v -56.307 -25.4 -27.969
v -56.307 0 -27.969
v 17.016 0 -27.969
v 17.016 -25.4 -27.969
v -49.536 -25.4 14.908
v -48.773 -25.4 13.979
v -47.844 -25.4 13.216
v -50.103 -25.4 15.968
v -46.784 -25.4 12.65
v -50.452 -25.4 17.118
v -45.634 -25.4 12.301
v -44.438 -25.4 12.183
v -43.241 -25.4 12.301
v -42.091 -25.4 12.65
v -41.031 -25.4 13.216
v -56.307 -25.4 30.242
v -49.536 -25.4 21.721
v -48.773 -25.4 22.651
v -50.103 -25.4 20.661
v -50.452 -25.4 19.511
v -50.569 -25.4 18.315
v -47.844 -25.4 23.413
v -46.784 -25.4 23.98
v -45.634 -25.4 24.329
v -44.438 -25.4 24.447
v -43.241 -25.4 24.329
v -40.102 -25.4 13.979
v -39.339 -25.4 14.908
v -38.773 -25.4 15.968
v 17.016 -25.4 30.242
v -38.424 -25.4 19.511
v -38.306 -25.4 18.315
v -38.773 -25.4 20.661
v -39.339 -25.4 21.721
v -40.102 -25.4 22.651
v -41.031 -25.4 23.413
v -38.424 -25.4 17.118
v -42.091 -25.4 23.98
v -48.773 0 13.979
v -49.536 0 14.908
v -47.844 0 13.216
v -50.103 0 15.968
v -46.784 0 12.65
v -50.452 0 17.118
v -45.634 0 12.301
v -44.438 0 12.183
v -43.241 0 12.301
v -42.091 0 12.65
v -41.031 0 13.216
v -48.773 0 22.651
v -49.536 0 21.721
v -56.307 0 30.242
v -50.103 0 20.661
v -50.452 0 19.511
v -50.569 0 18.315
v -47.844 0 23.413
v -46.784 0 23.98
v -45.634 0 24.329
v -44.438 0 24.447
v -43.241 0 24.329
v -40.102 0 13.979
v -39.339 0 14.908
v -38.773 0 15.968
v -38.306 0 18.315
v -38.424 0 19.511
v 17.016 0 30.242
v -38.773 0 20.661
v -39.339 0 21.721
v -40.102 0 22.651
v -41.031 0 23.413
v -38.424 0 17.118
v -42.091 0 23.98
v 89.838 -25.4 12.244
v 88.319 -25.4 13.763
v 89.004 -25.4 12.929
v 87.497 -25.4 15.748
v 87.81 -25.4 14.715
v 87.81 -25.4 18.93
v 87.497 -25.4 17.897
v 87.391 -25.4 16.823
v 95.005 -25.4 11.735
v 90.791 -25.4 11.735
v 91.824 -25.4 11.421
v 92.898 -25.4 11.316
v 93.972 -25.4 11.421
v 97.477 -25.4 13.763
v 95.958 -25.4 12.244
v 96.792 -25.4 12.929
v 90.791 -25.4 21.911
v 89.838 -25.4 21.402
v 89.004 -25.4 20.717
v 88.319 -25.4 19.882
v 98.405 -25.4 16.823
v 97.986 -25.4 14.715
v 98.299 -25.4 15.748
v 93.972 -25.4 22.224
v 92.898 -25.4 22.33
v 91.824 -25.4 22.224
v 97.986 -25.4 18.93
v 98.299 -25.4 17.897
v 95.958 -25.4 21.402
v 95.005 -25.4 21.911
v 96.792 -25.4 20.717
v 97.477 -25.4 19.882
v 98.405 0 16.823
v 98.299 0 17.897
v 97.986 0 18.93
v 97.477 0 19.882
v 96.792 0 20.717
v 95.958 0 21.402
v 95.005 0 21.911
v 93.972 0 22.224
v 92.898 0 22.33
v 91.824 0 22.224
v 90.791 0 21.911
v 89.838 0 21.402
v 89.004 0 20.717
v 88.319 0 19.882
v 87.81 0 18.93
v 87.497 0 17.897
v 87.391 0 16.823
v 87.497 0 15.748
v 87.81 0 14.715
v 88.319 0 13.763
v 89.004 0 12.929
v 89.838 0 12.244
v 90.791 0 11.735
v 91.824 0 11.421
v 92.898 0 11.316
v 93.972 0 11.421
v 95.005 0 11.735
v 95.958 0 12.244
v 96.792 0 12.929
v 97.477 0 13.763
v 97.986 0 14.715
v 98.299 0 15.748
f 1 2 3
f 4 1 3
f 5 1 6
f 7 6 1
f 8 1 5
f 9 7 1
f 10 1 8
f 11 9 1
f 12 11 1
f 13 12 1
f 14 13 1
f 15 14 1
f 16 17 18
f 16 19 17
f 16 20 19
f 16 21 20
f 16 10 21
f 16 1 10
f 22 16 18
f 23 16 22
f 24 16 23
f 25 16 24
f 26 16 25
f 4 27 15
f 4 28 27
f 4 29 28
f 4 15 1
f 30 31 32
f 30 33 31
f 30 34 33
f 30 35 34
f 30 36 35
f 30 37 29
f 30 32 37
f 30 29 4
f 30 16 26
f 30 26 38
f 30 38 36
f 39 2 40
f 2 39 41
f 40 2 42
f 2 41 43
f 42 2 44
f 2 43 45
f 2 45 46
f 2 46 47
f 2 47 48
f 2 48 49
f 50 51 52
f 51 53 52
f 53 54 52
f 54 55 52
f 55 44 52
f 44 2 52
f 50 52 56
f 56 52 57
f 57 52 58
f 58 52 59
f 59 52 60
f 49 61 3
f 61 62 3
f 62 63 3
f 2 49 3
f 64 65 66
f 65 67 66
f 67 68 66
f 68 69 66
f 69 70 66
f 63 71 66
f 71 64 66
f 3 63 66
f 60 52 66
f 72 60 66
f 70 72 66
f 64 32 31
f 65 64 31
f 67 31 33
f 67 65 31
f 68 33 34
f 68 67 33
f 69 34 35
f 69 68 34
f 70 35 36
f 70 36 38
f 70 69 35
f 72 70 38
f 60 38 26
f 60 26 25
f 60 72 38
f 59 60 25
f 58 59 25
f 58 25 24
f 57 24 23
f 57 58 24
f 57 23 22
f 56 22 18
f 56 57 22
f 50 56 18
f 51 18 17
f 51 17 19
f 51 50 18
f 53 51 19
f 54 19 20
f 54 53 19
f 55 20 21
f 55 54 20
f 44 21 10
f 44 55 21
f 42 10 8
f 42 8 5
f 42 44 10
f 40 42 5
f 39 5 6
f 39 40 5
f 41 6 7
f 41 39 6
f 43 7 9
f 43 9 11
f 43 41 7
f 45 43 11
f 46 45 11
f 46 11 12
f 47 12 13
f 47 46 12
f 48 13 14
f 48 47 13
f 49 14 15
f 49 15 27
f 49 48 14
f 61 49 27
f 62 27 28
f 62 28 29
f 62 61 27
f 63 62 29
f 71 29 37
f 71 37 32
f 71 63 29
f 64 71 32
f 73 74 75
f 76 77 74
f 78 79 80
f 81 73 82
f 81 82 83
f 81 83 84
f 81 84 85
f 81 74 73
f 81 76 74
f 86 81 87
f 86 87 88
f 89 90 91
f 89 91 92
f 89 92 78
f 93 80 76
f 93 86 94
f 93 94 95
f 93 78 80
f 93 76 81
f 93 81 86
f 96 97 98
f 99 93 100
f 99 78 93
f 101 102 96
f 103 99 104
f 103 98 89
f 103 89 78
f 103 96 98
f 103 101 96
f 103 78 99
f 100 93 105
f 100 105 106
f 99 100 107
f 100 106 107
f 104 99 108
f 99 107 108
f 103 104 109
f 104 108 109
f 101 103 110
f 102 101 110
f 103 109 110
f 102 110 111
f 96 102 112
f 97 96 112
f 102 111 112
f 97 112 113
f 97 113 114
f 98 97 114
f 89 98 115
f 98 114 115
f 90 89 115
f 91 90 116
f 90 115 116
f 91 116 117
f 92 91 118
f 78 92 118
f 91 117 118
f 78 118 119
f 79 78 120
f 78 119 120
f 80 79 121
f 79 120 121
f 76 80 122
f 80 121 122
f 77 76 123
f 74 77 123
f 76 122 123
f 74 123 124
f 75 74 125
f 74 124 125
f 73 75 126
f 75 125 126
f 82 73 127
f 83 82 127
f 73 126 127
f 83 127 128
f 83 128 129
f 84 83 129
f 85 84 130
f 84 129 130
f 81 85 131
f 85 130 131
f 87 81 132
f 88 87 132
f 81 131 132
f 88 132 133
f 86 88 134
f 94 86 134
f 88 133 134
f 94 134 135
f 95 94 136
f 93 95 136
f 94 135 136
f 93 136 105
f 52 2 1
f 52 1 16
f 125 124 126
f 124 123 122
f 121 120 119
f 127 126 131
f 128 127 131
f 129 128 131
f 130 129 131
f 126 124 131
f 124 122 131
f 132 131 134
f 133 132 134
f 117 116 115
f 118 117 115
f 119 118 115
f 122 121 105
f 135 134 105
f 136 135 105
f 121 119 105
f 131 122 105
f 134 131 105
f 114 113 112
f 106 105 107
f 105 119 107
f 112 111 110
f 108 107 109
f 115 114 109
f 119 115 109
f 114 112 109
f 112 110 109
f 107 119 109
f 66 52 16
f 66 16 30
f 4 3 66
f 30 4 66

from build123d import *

# Parameters (mm, degrees)
F0_W     = 73.323604
F0_H     = 58.211155
F0_R     = 6.131829
F0_R_2   = 5.507015
F1_DEPTH = 25.4


with BuildPart() as f1:
    # F0 (on Front) → F1 (new body)
    with BuildSketch(Plane.XZ):
        with Locations((-19.645693, 1.136731)):
            Rectangle(F0_W, F0_H)
        with Locations((-44.437636, 18.31474)):
            Circle(F0_R, mode=Mode.SUBTRACT)
        with Locations((92.898004, 16.822686)):
            Circle(F0_R_2)
    extrude(amount=F1_DEPTH)


solid = f1.part
